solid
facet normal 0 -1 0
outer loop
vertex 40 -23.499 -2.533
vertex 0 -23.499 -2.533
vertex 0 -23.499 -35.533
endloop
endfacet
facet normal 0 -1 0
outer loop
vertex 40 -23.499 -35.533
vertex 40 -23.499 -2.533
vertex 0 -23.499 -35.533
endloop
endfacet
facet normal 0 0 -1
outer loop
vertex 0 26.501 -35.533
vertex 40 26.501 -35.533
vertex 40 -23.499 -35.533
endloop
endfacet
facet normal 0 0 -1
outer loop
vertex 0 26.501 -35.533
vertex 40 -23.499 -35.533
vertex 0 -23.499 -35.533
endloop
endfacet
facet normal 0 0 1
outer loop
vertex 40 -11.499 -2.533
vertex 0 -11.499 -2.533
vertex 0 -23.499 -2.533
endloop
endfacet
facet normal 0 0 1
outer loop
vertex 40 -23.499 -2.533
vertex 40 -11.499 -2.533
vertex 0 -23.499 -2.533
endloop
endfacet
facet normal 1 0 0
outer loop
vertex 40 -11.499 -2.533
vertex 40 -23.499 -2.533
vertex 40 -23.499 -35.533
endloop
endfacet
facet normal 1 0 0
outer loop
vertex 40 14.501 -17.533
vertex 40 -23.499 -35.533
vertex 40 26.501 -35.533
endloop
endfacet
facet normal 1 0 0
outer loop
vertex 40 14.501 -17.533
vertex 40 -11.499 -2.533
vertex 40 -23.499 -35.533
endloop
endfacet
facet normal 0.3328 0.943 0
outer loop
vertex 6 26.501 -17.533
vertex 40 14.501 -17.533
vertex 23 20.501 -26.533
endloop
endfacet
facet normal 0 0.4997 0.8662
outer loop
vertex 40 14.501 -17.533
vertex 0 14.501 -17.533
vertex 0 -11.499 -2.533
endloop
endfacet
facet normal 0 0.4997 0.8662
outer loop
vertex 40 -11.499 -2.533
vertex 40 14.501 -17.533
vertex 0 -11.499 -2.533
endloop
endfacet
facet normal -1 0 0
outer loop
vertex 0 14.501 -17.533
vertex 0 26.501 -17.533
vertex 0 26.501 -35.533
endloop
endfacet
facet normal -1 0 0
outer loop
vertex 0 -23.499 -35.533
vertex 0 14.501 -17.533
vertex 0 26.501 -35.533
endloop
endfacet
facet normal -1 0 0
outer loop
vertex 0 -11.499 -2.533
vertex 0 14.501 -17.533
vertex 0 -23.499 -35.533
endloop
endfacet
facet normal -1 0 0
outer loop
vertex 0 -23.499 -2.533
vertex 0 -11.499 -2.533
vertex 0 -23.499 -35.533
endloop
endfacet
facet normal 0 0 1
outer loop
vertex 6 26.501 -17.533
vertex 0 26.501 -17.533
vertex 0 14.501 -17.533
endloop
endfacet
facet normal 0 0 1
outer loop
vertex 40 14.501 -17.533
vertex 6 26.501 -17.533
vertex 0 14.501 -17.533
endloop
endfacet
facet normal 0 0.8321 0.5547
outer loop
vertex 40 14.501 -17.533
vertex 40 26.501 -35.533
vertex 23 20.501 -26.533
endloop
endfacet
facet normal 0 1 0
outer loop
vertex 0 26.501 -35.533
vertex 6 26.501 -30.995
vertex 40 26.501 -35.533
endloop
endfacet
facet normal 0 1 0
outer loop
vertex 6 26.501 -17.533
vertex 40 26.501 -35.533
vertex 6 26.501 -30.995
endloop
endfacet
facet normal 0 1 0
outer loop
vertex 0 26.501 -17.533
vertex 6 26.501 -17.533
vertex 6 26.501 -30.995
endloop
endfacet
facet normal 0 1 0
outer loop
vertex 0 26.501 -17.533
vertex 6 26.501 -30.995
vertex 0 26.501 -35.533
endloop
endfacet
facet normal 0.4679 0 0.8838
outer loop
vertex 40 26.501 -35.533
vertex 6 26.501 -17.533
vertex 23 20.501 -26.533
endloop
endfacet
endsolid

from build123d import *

# Parameters (mm, degrees)
F1_DEPTH = 40
F2_W     = 12
F2_H     = 18
F3_DEPTH = 6
F7_DEPTH = 25.4
F8_DEPTH = 13.462
F9_DEPTH = 31.496


with BuildPart() as f1:
    # F0 (on Right) → F1 (new body)
    with BuildSketch(Plane.YZ):
        Polygon((-23.4989325106, -35.5329651147), (14.5010674894, -35.5329651147), (14.5010674894, -17.5329651147), (-11.4989325106, -2.5329651147), (-23.4989325106, -2.5329651147), align=None)
    extrude(amount=F1_DEPTH)

    # F2 (on face) → F3 (join)
    with BuildSketch(Plane(origin=(0, 0, 0), x_dir=(0, -1, 0), z_dir=(-1, 0, 0))):
        with Locations((-20.5010674894, -26.5329651147)):
            Rectangle(F2_W, F2_H)
    extrude(amount=-F3_DEPTH)

    # F5 (on face) → F7 (join)
    with BuildSketch(Plane(origin=(0, 26.5010674894, 0), x_dir=(-1, 0, 0), z_dir=(0, 1, 0))):
        Polygon((-40, -35.5329651147), (-6, -35.5329651147), (-6, -17.5329651147), align=None)
    extrude(amount=-F7_DEPTH)

    # F4 (on face) → F8 (join)
    with BuildSketch(Plane.XY.offset(-17.5329651147)):
        Polygon((6, 26.5010674894), (6, 14.5010674894), (40, 14.5010674894), align=None)
    extrude(amount=-F8_DEPTH)

    # F6 (on face) → F9 (join)
    with BuildSketch(Plane.YZ.offset(40)):
        Polygon((14.5010674894, -17.5329651147), (14.5010674894, -35.5329651147), (26.5010674894, -35.5329651147), align=None)
    extrude(amount=-F9_DEPTH)


solid = f1.part
